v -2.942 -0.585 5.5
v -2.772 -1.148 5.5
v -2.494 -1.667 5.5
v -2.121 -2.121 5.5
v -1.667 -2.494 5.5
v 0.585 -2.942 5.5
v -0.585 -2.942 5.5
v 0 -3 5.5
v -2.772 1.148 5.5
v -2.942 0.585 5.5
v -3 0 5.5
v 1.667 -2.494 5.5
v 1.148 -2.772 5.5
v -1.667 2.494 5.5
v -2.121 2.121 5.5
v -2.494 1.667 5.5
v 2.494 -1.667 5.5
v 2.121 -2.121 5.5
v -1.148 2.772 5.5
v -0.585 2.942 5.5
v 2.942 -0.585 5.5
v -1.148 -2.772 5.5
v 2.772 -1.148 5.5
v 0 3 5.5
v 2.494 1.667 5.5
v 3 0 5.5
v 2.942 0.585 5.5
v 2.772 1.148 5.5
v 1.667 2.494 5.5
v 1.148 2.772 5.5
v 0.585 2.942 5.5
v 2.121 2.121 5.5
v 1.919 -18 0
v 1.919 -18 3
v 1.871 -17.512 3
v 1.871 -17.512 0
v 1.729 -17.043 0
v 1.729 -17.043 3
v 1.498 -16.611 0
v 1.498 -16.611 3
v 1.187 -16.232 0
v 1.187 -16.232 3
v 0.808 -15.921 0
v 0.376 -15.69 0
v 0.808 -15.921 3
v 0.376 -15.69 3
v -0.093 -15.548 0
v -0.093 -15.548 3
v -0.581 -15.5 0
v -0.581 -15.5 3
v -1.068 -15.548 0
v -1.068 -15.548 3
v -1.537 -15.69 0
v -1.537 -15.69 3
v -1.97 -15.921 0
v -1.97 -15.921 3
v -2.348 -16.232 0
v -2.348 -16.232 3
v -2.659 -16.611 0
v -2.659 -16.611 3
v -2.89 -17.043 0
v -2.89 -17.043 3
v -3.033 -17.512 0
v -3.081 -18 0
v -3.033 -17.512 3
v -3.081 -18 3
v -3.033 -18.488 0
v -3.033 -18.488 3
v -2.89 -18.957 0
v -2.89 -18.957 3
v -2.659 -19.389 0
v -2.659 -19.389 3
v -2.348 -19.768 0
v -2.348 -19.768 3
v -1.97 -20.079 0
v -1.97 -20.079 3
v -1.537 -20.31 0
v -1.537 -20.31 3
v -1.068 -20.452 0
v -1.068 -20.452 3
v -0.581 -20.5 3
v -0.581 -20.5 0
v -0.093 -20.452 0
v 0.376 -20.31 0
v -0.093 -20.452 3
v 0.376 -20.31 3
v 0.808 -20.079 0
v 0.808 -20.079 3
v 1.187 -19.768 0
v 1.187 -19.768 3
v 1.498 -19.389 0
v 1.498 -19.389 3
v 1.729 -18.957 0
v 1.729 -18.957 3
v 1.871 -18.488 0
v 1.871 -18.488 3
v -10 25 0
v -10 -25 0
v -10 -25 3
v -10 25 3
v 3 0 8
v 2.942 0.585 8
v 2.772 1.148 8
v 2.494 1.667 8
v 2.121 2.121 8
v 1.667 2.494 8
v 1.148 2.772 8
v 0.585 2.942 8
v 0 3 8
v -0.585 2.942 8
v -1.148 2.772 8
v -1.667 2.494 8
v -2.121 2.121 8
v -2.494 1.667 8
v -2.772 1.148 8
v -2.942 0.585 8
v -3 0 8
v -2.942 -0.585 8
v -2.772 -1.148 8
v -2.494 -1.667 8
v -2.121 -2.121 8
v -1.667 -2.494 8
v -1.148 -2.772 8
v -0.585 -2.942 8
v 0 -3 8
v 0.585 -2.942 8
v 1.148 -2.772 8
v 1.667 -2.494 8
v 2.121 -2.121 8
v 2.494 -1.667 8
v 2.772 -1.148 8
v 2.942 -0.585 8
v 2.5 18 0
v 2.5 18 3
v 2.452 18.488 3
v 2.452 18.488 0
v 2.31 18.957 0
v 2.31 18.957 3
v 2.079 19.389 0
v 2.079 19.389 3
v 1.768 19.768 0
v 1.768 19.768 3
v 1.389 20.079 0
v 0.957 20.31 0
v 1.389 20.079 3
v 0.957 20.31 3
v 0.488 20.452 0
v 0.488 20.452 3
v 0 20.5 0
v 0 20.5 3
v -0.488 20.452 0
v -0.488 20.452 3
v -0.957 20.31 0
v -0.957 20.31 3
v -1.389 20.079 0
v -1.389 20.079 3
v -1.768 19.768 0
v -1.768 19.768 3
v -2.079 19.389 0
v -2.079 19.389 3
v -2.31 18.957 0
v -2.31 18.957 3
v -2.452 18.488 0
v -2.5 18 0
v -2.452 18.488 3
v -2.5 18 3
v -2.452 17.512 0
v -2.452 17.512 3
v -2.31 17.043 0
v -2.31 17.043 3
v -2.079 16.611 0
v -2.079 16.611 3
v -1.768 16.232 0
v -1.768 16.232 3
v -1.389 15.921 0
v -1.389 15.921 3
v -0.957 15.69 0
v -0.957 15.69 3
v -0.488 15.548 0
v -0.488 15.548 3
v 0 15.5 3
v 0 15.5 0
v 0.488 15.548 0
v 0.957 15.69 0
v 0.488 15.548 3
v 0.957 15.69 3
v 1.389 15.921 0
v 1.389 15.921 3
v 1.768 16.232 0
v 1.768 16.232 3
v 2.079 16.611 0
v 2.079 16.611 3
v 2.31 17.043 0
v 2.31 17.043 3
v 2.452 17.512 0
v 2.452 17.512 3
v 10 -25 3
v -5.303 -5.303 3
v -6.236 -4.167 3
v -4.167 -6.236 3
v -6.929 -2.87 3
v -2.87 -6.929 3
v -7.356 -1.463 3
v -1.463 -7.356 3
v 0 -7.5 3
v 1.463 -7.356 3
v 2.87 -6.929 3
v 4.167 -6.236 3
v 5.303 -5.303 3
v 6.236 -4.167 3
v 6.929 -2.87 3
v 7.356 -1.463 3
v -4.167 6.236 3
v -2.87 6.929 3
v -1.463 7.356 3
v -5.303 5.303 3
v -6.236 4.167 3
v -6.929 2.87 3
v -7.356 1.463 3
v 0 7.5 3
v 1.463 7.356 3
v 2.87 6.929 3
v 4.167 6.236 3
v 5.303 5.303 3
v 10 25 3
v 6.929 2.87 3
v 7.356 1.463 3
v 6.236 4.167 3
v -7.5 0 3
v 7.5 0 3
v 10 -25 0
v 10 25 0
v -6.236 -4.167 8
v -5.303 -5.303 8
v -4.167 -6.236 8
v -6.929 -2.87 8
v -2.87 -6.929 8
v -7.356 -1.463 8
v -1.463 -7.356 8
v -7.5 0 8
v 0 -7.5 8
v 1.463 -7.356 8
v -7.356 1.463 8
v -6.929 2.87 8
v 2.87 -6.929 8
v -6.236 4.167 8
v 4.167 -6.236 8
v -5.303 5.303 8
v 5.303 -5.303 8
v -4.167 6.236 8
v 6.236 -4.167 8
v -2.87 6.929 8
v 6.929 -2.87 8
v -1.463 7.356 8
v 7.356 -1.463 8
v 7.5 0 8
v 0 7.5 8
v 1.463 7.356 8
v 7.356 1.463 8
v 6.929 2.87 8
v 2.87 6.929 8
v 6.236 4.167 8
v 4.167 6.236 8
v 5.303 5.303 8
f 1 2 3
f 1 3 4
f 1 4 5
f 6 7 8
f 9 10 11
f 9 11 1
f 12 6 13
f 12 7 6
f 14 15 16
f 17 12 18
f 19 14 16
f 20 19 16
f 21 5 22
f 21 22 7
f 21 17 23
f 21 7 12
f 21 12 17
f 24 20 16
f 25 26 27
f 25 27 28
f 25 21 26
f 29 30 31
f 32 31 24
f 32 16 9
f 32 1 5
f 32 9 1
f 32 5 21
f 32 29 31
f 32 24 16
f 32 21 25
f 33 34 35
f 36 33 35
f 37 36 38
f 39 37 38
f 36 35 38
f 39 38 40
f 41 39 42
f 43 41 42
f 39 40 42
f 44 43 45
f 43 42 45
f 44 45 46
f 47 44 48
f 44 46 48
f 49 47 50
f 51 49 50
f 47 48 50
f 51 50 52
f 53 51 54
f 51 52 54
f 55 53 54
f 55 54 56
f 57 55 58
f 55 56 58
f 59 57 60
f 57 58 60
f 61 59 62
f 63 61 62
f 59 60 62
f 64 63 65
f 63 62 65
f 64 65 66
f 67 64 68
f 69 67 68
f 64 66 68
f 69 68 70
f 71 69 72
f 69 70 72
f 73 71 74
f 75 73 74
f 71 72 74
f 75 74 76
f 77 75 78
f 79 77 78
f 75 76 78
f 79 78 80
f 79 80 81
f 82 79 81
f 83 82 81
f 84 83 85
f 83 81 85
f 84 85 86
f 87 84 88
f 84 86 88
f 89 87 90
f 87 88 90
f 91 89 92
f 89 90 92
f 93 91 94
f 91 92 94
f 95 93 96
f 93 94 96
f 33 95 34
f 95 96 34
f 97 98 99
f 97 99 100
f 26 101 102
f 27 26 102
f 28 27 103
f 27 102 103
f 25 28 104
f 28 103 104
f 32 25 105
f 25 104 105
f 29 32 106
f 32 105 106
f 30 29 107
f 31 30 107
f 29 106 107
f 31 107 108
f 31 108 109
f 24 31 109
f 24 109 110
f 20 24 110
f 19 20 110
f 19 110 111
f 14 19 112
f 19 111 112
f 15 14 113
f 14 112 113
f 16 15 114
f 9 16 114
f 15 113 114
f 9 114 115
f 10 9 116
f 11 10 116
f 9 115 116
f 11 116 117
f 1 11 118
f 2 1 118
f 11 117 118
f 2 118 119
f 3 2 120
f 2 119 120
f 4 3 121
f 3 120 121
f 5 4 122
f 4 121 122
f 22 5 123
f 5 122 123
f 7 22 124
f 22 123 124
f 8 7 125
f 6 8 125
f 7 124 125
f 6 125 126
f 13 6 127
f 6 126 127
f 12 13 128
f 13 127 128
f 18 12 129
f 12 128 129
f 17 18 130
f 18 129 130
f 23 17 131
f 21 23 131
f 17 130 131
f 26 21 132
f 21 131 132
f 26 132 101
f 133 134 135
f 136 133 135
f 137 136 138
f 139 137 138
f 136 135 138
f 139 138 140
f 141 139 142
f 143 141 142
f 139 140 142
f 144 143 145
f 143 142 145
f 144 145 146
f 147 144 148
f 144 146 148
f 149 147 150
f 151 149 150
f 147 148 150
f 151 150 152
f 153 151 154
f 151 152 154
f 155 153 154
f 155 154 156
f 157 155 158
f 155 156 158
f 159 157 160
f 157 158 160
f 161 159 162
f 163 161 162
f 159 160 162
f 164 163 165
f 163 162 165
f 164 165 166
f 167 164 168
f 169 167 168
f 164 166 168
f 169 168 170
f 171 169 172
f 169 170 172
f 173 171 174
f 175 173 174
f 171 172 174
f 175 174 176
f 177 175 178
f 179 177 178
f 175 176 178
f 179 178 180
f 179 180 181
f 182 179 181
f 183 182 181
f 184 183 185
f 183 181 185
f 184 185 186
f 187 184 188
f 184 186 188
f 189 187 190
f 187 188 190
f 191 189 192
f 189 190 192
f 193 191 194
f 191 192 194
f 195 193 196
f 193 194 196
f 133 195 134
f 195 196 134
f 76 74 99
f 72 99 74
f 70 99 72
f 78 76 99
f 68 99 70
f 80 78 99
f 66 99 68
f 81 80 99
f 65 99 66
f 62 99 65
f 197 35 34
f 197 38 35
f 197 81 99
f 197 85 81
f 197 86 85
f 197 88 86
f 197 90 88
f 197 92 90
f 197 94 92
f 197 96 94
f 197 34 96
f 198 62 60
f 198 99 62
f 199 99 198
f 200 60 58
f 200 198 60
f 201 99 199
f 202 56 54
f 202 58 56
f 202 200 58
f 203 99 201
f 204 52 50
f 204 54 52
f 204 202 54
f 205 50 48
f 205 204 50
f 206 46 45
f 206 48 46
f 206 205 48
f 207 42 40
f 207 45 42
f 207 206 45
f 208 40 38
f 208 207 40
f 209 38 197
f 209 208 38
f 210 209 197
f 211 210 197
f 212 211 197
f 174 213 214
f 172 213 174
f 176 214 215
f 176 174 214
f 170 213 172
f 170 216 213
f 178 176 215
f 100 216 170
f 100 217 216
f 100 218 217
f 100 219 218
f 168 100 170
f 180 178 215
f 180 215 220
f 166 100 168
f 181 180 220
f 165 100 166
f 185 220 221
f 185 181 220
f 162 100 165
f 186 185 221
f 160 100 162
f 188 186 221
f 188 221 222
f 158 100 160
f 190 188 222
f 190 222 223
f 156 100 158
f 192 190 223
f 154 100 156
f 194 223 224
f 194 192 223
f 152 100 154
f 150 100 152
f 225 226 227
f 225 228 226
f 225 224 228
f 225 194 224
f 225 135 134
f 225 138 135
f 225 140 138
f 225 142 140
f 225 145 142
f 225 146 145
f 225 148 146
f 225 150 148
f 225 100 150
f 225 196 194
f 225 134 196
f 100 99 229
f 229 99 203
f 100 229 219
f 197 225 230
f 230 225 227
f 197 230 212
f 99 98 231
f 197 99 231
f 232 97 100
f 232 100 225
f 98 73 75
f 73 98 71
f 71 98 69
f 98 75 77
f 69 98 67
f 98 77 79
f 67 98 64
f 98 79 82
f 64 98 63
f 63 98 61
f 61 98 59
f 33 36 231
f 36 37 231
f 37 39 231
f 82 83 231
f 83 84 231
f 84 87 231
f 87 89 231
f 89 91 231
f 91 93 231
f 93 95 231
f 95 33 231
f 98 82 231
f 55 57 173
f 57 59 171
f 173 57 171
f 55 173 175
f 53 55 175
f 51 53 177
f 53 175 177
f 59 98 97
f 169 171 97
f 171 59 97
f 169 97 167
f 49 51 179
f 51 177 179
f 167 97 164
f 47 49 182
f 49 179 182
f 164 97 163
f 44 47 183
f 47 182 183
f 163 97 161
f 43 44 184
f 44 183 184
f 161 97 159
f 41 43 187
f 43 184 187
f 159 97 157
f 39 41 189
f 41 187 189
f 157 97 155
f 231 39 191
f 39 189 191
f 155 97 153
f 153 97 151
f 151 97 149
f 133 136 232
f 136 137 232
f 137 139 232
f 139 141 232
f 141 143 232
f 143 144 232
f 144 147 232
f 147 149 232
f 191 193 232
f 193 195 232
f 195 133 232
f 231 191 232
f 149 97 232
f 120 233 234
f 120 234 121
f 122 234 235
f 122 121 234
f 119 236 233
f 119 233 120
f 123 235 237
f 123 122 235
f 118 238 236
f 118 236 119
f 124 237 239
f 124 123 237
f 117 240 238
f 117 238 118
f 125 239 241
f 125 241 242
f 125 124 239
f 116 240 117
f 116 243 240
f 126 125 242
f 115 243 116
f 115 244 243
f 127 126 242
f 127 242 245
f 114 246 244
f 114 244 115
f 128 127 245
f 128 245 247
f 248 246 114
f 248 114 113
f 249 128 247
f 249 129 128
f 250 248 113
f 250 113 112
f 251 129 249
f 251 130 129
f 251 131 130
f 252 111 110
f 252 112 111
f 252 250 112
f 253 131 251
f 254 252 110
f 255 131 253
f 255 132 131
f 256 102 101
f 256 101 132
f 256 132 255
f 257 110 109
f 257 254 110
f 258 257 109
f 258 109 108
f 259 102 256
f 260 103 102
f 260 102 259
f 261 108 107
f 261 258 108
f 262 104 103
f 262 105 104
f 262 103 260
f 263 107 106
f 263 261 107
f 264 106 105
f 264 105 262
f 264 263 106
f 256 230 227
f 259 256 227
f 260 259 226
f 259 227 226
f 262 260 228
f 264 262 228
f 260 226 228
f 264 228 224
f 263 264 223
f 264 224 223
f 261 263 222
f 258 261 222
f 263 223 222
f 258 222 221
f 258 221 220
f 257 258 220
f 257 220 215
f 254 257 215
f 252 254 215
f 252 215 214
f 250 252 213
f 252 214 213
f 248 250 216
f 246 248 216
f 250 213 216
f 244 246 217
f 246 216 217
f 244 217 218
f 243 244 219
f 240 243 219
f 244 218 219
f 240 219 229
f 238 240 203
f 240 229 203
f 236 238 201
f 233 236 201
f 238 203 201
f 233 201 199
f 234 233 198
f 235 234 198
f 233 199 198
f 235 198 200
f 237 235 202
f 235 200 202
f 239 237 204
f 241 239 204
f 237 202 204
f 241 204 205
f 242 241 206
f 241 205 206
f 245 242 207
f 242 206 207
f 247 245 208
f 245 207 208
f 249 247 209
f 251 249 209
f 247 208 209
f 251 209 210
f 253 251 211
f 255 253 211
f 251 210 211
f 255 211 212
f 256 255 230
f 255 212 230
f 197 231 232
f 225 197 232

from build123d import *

# Parameters (mm, degrees)
SKETCH_1_W          = 20
SKETCH_1_H          = 50
EXTRUDE_1_DEPTH     = 3
SKETCH_2_R          = 7.5
EXTRUDE_2_DEPTH     = 5
SKETCH_3_R          = 3
CUT_EXTRUDE_1_DEPTH = 2.5
SKETCH_4_R          = 2.5
CUT_EXTRUDE_2_DEPTH = 3


with BuildPart() as part:
    # 草图1 → 凸台-拉伸1 (new body)
    with BuildSketch(Plane.XY):
        Rectangle(SKETCH_1_W, SKETCH_1_H)
    extrude(amount=EXTRUDE_1_DEPTH)

    # 草图2 → 凸台-拉伸2 (add)
    with BuildSketch(Plane.XY.offset(3)):
        Circle(SKETCH_2_R)
    extrude(amount=EXTRUDE_2_DEPTH)

    # 草图3 → 切除-拉伸1 (cut)
    with BuildSketch(Plane.XY.offset(8)):
        Circle(SKETCH_3_R)
    extrude(amount=-CUT_EXTRUDE_1_DEPTH, mode=Mode.SUBTRACT)

    # 草图4 → 切除-拉伸2 (cut)
    with BuildSketch(Plane.XY.offset(3)):
        with Locations((0, 18)):
            Circle(SKETCH_4_R)
        with Locations((-0.580661347, -18)):
            Circle(SKETCH_4_R)
    extrude(amount=-CUT_EXTRUDE_2_DEPTH, mode=Mode.SUBTRACT)


solid = part.part
